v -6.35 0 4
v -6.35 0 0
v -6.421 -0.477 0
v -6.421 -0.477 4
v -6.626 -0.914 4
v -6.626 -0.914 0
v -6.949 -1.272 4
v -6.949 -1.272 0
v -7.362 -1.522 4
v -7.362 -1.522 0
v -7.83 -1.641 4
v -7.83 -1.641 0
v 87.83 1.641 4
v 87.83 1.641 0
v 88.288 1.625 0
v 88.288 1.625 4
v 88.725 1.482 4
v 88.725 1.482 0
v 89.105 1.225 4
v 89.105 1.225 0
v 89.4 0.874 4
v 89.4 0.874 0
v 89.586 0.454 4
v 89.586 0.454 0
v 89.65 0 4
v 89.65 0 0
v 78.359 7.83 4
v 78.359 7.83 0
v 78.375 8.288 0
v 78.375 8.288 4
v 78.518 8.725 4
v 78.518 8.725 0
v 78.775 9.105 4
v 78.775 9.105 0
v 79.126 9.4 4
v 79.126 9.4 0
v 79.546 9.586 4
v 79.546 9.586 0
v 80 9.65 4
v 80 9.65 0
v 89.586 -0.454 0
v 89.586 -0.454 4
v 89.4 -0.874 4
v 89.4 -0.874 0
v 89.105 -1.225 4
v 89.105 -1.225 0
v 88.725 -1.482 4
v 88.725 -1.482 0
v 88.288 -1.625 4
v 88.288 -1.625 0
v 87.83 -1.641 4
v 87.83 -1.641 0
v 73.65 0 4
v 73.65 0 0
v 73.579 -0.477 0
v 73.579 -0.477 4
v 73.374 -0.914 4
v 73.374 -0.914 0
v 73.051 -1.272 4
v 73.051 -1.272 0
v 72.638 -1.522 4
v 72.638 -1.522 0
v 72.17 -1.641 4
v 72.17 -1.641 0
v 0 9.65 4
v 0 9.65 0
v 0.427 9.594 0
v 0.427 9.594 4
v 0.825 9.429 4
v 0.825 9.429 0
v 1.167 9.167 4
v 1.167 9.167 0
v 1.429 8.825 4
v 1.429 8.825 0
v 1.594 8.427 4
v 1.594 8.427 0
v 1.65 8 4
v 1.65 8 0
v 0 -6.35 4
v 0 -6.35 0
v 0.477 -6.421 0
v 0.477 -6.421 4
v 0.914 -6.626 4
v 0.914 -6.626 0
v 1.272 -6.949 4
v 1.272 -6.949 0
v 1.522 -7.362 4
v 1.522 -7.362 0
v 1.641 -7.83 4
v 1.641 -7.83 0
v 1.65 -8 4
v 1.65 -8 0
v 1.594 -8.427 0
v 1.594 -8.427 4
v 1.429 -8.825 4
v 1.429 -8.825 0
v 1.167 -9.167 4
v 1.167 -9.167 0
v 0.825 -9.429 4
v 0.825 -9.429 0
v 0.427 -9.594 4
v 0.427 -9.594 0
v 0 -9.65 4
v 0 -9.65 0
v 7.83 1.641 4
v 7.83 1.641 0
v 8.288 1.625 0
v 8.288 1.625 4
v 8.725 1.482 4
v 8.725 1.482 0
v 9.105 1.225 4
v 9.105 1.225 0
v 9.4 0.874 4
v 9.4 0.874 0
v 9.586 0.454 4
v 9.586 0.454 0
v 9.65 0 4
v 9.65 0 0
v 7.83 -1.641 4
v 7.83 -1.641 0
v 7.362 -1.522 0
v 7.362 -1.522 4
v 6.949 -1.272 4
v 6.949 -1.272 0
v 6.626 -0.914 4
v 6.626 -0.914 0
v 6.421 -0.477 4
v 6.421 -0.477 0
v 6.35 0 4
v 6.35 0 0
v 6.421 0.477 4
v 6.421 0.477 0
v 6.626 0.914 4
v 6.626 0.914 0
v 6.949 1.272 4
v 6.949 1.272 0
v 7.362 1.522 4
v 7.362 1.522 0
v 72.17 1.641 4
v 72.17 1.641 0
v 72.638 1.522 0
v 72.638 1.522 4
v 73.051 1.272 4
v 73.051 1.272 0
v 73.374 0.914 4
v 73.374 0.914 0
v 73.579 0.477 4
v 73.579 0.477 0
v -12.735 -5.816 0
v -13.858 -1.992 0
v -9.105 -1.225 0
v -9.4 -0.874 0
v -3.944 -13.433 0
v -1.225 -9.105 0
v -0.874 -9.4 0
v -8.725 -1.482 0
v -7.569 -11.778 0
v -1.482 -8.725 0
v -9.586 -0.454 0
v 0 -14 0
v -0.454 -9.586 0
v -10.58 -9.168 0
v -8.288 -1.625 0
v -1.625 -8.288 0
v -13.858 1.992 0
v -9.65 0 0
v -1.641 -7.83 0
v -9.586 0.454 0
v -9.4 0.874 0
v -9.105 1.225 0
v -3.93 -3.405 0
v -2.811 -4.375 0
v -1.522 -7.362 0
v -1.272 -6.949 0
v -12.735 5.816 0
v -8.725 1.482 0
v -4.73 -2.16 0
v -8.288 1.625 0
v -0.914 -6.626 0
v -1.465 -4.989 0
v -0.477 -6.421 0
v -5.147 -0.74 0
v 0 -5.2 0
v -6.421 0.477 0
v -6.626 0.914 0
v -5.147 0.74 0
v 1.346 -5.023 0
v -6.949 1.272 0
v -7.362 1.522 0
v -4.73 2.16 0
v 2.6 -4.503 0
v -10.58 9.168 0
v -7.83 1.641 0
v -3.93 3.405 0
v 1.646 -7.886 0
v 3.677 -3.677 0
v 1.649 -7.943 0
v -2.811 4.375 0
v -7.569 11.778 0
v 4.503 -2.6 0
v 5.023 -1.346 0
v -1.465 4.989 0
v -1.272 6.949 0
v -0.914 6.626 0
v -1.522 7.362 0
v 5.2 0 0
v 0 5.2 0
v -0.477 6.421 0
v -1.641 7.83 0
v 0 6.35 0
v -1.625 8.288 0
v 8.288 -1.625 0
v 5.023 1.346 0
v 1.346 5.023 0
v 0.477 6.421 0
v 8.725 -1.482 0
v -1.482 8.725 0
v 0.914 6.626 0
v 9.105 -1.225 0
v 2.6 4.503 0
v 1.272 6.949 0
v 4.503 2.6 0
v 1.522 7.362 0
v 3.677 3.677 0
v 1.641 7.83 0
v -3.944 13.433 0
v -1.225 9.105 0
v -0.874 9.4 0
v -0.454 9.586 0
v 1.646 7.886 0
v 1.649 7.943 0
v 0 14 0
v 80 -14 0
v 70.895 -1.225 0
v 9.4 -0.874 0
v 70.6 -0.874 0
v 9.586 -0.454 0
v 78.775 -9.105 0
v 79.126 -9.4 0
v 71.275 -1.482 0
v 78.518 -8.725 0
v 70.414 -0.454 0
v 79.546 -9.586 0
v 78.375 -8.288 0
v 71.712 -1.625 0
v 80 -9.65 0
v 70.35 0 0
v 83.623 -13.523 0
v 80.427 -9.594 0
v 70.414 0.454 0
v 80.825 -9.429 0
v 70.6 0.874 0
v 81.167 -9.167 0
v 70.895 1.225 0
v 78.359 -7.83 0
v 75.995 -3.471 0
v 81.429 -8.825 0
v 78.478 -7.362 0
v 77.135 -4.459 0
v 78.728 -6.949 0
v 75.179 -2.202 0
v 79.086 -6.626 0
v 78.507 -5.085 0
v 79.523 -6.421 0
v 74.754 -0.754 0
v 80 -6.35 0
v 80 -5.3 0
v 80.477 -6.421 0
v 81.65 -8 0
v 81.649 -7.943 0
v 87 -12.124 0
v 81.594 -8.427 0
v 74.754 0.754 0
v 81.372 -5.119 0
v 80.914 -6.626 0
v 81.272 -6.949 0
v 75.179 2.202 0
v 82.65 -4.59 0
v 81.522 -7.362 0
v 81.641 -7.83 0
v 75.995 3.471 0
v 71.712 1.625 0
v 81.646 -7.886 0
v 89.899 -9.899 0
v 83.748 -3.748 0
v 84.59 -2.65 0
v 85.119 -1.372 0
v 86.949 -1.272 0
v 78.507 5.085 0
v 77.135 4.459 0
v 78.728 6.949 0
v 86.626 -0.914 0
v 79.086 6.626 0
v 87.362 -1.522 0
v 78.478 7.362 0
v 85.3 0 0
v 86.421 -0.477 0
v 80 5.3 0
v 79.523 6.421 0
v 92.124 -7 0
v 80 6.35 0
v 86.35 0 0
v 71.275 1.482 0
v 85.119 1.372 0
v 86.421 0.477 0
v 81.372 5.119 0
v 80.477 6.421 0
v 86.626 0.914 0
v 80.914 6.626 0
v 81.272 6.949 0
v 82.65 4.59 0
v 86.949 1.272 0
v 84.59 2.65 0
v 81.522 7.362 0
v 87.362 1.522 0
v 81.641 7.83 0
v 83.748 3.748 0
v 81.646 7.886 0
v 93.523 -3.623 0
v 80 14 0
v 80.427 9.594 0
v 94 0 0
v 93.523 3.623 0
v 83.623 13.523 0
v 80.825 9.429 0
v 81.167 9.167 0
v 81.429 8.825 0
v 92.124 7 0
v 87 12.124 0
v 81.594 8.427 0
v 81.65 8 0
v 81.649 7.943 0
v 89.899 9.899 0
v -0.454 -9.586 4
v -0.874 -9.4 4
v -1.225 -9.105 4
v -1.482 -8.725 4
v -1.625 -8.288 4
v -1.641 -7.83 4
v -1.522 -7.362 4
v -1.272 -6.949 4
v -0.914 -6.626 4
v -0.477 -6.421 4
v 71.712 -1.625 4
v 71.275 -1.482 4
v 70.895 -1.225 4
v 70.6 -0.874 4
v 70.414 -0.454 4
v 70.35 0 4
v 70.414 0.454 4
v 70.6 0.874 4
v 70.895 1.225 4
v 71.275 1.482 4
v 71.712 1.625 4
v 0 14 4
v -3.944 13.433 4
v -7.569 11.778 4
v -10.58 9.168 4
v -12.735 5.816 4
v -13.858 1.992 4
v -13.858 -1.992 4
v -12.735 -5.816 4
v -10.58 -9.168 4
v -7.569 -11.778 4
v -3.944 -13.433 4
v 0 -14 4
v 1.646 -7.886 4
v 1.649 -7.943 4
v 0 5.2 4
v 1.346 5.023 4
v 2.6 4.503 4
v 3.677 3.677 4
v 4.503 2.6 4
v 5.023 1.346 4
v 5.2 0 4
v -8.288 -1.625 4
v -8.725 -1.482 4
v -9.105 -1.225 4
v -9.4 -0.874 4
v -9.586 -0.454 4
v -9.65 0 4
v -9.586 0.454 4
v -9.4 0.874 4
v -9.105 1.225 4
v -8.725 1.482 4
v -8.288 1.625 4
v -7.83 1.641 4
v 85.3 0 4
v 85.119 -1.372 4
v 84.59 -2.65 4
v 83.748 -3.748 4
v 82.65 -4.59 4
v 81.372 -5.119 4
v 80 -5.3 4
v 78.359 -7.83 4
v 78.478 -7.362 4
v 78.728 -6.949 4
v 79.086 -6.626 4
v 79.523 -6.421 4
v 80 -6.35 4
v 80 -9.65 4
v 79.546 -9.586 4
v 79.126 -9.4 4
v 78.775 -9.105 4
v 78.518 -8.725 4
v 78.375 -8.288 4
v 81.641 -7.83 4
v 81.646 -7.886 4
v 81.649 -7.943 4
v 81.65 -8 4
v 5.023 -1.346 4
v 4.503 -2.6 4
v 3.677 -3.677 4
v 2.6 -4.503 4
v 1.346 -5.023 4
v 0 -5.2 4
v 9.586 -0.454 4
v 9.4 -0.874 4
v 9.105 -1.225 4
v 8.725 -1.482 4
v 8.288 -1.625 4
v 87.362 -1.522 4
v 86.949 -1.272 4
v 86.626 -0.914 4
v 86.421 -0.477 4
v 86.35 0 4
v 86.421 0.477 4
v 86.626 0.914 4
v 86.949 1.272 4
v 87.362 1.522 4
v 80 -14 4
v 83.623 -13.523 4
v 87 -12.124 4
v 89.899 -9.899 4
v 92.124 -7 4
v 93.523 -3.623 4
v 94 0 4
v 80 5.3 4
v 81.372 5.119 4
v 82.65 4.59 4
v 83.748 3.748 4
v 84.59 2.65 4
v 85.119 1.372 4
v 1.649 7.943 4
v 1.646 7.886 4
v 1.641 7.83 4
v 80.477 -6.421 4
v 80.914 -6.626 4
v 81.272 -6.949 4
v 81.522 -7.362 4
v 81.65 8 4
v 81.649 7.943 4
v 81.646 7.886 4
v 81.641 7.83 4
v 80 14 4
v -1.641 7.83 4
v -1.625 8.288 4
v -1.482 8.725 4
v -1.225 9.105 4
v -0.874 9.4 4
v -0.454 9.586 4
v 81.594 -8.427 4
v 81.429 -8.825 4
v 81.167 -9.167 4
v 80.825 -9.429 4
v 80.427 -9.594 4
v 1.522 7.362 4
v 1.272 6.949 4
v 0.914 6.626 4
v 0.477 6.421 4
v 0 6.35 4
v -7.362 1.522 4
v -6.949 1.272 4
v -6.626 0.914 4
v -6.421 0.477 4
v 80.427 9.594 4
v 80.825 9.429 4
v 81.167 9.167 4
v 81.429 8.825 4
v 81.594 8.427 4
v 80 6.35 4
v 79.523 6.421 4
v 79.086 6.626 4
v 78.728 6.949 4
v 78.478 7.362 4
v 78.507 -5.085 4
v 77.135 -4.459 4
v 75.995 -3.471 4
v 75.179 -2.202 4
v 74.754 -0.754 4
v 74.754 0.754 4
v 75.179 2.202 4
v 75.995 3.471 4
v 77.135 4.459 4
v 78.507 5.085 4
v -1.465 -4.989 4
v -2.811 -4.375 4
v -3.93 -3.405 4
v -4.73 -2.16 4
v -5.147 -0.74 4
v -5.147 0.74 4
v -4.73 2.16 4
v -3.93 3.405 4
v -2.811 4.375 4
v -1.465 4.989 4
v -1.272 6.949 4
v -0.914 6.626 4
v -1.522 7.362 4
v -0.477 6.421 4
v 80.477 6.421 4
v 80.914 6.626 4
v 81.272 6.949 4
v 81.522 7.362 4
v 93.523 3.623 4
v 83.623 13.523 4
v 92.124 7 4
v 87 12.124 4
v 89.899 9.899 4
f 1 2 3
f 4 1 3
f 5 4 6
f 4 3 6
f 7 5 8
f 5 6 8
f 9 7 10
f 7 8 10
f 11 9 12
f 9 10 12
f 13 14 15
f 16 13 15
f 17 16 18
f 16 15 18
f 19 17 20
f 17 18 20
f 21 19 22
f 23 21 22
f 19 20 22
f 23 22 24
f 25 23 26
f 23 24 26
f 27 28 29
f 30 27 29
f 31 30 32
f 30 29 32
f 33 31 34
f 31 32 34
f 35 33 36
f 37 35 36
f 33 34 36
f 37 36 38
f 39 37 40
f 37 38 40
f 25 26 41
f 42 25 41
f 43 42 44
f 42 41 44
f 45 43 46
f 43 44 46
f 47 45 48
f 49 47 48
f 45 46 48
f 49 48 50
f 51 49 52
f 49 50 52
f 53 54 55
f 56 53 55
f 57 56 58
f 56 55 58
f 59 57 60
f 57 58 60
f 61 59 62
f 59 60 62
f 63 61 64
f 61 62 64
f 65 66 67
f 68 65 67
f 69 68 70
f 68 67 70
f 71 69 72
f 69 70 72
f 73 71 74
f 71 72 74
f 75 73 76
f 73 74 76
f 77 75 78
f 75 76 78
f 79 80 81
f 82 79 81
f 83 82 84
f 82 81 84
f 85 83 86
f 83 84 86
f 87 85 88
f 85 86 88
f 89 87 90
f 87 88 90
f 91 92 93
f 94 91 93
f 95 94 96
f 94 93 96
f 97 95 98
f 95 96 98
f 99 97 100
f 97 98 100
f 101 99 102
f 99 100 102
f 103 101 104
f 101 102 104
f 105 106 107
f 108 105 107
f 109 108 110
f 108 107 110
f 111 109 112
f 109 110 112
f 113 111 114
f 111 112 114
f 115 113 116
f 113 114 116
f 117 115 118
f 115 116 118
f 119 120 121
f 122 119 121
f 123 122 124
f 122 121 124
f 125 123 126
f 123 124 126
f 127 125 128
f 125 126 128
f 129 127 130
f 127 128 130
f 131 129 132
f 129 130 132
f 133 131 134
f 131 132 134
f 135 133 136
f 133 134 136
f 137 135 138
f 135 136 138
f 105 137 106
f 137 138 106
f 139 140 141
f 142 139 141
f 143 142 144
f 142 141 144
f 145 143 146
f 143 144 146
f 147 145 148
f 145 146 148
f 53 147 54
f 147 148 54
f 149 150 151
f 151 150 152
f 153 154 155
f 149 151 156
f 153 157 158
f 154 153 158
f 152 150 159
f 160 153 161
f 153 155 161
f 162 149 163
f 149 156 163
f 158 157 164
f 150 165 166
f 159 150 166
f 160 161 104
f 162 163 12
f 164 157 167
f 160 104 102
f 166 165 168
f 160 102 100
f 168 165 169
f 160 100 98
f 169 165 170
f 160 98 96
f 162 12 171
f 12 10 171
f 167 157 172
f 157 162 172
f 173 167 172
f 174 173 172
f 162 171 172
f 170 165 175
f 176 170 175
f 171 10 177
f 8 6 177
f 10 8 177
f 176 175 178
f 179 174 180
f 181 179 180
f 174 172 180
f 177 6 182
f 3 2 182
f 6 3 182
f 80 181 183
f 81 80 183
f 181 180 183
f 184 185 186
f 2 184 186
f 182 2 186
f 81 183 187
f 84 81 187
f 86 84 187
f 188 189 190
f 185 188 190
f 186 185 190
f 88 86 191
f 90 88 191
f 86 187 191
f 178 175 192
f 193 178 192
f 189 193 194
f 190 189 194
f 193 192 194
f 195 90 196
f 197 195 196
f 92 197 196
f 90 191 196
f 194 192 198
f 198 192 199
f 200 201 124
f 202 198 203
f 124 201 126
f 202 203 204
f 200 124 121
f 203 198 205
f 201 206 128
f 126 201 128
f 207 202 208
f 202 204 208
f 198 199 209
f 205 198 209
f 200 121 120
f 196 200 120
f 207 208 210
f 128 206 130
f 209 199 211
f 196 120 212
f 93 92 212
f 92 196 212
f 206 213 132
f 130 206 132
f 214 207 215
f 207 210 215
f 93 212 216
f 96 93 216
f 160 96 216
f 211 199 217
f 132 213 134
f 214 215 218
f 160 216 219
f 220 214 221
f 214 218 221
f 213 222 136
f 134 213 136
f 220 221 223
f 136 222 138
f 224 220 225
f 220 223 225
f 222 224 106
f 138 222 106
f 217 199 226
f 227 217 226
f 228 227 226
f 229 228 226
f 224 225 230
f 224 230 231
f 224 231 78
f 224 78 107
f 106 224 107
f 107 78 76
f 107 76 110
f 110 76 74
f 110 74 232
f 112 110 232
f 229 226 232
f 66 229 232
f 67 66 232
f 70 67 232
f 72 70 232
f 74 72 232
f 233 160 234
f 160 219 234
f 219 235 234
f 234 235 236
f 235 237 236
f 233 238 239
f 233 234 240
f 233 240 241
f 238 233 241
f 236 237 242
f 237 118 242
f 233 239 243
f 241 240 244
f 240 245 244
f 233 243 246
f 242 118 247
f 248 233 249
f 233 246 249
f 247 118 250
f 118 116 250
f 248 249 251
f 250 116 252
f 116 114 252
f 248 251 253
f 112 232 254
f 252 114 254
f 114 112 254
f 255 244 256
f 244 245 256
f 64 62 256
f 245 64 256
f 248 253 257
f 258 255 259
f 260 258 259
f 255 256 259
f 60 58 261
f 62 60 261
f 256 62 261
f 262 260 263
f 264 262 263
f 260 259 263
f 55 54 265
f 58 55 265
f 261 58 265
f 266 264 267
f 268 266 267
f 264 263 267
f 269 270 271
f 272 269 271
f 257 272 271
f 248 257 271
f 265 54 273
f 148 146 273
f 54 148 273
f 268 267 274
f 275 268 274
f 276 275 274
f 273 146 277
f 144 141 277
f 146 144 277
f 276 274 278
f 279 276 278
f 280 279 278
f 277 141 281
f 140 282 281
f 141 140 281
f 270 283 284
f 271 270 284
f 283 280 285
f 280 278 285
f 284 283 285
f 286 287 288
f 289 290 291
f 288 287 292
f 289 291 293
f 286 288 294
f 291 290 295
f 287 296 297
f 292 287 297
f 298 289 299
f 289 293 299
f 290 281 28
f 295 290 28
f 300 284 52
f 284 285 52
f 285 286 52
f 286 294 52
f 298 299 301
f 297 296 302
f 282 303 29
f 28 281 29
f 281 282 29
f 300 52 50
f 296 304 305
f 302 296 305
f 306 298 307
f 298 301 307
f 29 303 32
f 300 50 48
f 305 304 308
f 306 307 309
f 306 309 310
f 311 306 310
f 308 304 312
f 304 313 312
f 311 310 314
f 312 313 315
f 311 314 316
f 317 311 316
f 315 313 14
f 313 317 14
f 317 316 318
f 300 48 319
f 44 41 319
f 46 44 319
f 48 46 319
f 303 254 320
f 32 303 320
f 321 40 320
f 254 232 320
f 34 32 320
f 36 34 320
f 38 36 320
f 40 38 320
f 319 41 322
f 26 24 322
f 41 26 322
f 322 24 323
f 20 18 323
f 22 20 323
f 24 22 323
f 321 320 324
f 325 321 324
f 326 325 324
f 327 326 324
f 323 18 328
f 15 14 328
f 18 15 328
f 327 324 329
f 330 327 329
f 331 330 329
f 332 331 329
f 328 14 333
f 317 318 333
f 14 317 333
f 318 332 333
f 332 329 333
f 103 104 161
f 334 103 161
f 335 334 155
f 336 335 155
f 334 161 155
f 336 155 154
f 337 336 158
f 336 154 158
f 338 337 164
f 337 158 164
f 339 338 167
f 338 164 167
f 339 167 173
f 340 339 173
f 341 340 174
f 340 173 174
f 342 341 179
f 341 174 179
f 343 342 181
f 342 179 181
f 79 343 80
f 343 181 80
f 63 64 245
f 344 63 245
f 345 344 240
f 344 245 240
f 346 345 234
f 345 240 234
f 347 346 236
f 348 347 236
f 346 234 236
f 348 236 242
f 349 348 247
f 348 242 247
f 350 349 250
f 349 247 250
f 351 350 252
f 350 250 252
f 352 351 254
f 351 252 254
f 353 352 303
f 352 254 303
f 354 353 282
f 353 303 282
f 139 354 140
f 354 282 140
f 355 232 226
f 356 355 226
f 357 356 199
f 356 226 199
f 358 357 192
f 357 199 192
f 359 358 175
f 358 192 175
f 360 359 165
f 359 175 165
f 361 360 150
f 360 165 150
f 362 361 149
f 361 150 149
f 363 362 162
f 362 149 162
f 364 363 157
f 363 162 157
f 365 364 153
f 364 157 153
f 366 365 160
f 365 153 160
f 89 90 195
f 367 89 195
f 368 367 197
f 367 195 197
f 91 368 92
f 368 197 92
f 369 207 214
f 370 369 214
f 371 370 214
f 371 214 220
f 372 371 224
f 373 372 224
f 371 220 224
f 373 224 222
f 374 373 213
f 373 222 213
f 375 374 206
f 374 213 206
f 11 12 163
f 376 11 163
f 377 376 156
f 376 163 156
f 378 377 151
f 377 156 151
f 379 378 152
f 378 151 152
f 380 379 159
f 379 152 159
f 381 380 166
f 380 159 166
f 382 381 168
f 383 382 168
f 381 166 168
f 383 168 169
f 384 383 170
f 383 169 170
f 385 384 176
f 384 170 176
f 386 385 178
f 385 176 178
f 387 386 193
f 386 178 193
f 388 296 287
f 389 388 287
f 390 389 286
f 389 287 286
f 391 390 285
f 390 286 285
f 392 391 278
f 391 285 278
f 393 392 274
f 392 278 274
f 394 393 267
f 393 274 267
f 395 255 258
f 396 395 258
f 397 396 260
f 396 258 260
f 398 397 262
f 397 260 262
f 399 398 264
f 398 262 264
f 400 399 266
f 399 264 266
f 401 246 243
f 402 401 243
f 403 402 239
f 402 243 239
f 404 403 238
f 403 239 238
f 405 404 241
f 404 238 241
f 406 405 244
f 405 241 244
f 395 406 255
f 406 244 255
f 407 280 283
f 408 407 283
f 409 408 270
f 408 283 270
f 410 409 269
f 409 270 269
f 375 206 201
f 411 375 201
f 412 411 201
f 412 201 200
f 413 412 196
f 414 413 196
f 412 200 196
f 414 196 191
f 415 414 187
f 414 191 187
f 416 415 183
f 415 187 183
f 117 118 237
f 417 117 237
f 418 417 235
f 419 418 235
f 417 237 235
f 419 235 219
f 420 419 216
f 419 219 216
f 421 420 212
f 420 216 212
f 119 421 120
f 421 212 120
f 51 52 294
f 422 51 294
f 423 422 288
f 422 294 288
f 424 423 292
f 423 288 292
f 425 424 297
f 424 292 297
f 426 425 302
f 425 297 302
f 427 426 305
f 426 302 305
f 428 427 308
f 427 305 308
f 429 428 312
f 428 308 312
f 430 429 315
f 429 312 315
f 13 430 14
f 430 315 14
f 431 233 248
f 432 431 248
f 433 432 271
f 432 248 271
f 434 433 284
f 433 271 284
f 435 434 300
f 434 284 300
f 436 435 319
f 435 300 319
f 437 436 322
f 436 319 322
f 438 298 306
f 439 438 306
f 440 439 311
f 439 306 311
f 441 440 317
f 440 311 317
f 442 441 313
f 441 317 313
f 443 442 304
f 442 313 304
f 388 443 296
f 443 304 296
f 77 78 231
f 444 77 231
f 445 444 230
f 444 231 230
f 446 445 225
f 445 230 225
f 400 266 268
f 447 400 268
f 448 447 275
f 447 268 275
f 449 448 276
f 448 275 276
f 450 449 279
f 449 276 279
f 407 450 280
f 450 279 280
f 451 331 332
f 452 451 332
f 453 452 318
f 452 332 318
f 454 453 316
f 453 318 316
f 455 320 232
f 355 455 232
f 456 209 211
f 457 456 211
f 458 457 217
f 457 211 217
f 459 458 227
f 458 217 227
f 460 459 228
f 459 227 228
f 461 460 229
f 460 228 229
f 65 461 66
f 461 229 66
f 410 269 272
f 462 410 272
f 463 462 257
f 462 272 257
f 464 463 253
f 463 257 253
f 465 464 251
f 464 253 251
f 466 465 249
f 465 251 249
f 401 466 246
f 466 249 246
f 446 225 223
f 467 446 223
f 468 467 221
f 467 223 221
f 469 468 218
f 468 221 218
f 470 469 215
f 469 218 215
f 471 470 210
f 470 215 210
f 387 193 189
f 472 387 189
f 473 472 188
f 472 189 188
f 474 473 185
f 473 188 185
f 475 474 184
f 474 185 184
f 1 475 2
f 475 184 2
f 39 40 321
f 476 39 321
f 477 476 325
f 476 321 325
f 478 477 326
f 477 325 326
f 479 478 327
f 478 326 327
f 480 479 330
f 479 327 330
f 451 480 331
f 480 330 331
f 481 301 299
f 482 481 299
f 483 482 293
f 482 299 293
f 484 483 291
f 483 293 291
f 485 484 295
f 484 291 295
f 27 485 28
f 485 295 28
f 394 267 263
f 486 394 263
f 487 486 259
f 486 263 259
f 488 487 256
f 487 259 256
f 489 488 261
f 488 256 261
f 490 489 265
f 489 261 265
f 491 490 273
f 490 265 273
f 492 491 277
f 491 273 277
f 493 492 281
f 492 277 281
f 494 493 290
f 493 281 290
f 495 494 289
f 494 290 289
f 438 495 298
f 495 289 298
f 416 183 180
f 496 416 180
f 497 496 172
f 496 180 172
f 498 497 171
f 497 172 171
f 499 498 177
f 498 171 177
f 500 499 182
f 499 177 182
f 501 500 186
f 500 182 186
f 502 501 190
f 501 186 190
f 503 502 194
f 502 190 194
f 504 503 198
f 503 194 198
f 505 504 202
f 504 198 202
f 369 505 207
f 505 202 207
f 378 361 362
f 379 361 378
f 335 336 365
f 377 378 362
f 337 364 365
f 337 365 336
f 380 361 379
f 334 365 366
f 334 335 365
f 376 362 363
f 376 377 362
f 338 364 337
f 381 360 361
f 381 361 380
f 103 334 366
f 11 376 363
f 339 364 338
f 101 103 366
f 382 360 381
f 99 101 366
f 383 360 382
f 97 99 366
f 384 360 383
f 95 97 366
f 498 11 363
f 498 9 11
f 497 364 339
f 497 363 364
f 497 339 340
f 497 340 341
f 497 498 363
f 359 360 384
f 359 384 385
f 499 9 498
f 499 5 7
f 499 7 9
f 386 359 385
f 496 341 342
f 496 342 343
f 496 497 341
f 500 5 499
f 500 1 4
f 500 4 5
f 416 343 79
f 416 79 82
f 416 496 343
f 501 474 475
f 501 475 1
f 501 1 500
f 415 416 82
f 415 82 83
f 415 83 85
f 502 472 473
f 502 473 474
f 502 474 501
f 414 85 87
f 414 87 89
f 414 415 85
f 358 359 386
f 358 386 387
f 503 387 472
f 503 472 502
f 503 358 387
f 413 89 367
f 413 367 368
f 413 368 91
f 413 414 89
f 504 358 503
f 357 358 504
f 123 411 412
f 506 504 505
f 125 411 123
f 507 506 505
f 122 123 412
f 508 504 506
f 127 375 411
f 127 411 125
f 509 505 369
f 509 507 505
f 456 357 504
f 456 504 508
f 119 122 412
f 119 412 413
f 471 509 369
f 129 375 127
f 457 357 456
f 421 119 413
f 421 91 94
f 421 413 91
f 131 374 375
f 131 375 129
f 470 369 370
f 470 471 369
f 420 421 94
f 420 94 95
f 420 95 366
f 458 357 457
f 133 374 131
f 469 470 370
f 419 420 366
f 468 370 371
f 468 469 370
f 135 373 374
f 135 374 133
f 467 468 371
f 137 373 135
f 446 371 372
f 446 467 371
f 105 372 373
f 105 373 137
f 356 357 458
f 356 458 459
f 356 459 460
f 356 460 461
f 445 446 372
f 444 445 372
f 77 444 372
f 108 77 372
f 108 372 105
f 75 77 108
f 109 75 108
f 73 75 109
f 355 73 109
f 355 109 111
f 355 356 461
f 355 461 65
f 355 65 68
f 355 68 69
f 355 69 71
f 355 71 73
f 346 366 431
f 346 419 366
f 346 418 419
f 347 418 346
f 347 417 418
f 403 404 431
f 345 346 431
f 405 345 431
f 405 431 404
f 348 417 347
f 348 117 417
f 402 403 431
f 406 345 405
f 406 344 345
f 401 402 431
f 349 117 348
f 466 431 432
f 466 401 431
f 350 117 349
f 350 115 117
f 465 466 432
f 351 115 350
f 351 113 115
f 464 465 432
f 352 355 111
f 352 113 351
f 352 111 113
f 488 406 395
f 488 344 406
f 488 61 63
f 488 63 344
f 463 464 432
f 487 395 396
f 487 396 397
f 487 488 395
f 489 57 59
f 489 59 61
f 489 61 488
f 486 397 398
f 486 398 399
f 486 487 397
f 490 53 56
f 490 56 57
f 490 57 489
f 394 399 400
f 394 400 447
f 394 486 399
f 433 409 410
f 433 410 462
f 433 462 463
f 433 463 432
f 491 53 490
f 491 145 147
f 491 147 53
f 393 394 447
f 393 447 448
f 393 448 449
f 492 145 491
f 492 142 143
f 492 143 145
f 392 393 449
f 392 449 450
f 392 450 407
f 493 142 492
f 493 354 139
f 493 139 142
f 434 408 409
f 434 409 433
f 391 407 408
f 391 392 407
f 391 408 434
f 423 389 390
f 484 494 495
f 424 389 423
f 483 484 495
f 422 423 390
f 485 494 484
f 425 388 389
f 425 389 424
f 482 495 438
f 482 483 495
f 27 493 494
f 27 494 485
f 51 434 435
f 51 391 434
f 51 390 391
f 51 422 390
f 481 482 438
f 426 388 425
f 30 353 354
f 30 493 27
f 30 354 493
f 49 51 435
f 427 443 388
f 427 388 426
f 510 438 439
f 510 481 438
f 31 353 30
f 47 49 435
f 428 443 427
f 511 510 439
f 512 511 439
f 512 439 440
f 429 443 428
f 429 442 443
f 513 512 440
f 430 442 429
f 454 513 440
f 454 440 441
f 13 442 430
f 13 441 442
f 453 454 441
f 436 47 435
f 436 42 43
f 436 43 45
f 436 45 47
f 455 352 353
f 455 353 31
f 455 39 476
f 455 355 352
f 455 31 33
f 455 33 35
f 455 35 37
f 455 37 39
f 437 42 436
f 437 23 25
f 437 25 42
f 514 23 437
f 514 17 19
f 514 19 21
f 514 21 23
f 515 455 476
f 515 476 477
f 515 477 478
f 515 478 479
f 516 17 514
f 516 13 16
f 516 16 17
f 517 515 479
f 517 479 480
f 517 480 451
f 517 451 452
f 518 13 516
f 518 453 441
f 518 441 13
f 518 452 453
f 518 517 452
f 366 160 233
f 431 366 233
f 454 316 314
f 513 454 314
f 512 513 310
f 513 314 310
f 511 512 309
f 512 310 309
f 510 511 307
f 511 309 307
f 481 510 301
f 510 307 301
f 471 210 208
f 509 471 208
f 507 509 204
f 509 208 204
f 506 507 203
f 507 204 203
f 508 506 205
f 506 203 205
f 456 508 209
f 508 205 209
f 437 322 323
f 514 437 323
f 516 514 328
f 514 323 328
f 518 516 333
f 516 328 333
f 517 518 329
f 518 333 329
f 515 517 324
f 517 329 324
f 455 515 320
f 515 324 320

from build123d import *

# Parameters (mm, degrees)
EXTRUDE_1_DEPTH = 4


with BuildPart() as part:
    # 草图1 → 凸台-拉伸1 (new body)
    with BuildSketch(Plane.XY):
        with BuildLine():
            Line((0, 9.65), (0, 14))
            ThreePointArc((0, 14), (-14, 0), (0, -14))
            Line((0, -14), (0, -9.65))
            ThreePointArc((0, -9.65), (-1.225409689, -9.104930357), (-1.641202867, -7.82984375))
            ThreePointArc((-1.641202867, -7.82984375), (-5.656854249, -5.656854249), (-7.82984375, -1.641202867))
            ThreePointArc((-7.82984375, -1.641202867), (-9.65, 0), (-7.82984375, 1.641202867))
            ThreePointArc((-7.82984375, 1.641202867), (-5.656854249, 5.656854249), (-1.641202867, 7.82984375))
            ThreePointArc((-1.641202867, 7.82984375), (-1.225409689, 9.104930357), (0, 9.65))
        make_face()
        with BuildLine():
            ThreePointArc((0, 6.35), (-1.104930357, 6.774590311), (-1.641202867, 7.82984375))
            ThreePointArc((-1.641202867, 7.82984375), (-5.656854249, 5.656854249), (-7.82984375, 1.641202867))
            ThreePointArc((-7.82984375, 1.641202867), (-6.774590311, 1.104930357), (-6.35, 0))
            ThreePointArc((-6.35, 0), (-6.774590311, -1.104930357), (-7.82984375, -1.641202867))
            ThreePointArc((-7.82984375, -1.641202867), (-5.656854249, -5.656854249), (-1.641202867, -7.82984375))
            ThreePointArc((-1.641202867, -7.82984375), (-1.104930357, -6.774590311), (0, -6.35))
            Line((0, -6.35), (0, -5.2))
            ThreePointArc((0, -5.2), (-5.2, 0), (0, 5.2))
            Line((0, 5.2), (0, 6.35))
        make_face()
        with BuildLine():
            ThreePointArc((1.641202867, 7.82984375), (1.104930357, 6.774590311), (0, 6.35))
            Line((0, 6.35), (0, 5.2))
            ThreePointArc((0, 5.2), (3.676955262, 3.676955262), (5.2, 0))
            ThreePointArc((5.2, 0), (3.676955262, -3.676955262), (0, -5.2))
            Line((0, -5.2), (0, -6.35))
            ThreePointArc((0, -6.35), (1.104930357, -6.774590311), (1.641202867, -7.82984375))
            ThreePointArc((1.641202867, -7.82984375), (5.656854249, -5.656854249), (7.82984375, -1.641202867))
            ThreePointArc((7.82984375, -1.641202867), (6.35, 0), (7.82984375, 1.641202867))
            ThreePointArc((7.82984375, 1.641202867), (5.656854249, 5.656854249), (1.641202867, 7.82984375))
        make_face()
        with BuildLine():
            ThreePointArc((14, 0), (9.899494937, 9.899494937), (0, 14))
            Line((0, 14), (0, 9.65))
            ThreePointArc((0, 9.65), (1.166726189, 9.166726189), (1.65, 8))
            ThreePointArc((1.65, 8), (1.647799249, 7.914808247), (1.641202867, 7.82984375))
            ThreePointArc((1.641202867, 7.82984375), (5.656854249, 5.656854249), (7.82984375, 1.641202867))
            ThreePointArc((7.82984375, 1.641202867), (9.104930357, 1.225409689), (9.65, 0))
            ThreePointArc((9.65, 0), (9.104930357, -1.225409689), (7.82984375, -1.641202867))
            ThreePointArc((7.82984375, -1.641202867), (5.656854249, -5.656854249), (1.641202867, -7.82984375))
            ThreePointArc((1.641202867, -7.82984375), (1.647799249, -7.914808247), (1.65, -8))
            ThreePointArc((1.65, -8), (1.166726189, -9.166726189), (0, -9.65))
            Line((0, -9.65), (0, -14))
            ThreePointArc((0, -14), (9.899494937, -9.899494937), (14, 0))
        make_face()
        with BuildLine():
            ThreePointArc((94, 0), (89.899494937, 9.899494937), (80, 14))
            Line((80, 14), (80, 9.65))
            ThreePointArc((80, 9.65), (81.166726189, 9.166726189), (81.65, 8))
            ThreePointArc((81.65, 8), (81.647799249, 7.914808247), (81.641202867, 7.82984375))
            ThreePointArc((81.641202867, 7.82984375), (85.656854249, 5.656854249), (87.82984375, 1.641202867))
            ThreePointArc((87.82984375, 1.641202867), (89.104930357, 1.225409689), (89.65, 0))
            ThreePointArc((89.65, 0), (89.104930357, -1.225409689), (87.82984375, -1.641202867))
            ThreePointArc((87.82984375, -1.641202867), (85.656854249, -5.656854249), (81.641202867, -7.82984375))
            ThreePointArc((81.641202867, -7.82984375), (81.647799249, -7.914808247), (81.65, -8))
            ThreePointArc((81.65, -8), (81.166726189, -9.166726189), (80, -9.65))
            Line((80, -9.65), (80, -14))
            ThreePointArc((80, -14), (89.899494937, -9.899494937), (94, 0))
        make_face()
        with BuildLine():
            Line((80, 9.65), (80, 14))
            ThreePointArc((80, 14), (66, 0), (80, -14))
            Line((80, -14), (80, -9.65))
            ThreePointArc((80, -9.65), (78.774590311, -9.104930357), (78.358797133, -7.82984375))
            ThreePointArc((78.358797133, -7.82984375), (74.343145751, -5.656854249), (72.17015625, -1.641202867))
            ThreePointArc((72.17015625, -1.641202867), (70.35, 0), (72.17015625, 1.641202867))
            ThreePointArc((72.17015625, 1.641202867), (74.343145751, 5.656854249), (78.358797133, 7.82984375))
            ThreePointArc((78.358797133, 7.82984375), (78.774590311, 9.104930357), (80, 9.65))
        make_face()
        with BuildLine():
            ThreePointArc((80, 6.35), (78.895069643, 6.774590311), (78.358797133, 7.82984375))
            ThreePointArc((78.358797133, 7.82984375), (74.343145751, 5.656854249), (72.17015625, 1.641202867))
            ThreePointArc((72.17015625, 1.641202867), (73.225409689, 1.104930357), (73.65, 0))
            ThreePointArc((73.65, 0), (73.225409689, -1.104930357), (72.17015625, -1.641202867))
            ThreePointArc((72.17015625, -1.641202867), (74.343145751, -5.656854249), (78.358797133, -7.82984375))
            ThreePointArc((78.358797133, -7.82984375), (78.895069643, -6.774590311), (80, -6.35))
            Line((80, -6.35), (80, -5.3))
            ThreePointArc((80, -5.3), (74.7, 0), (80, 5.3))
            Line((80, 5.3), (80, 6.35))
        make_face()
        with BuildLine():
            ThreePointArc((81.641202867, 7.82984375), (81.104930357, 6.774590311), (80, 6.35))
            Line((80, 6.35), (80, 5.3))
            ThreePointArc((80, 5.3), (83.74766594, 3.74766594), (85.3, 0))
            ThreePointArc((85.3, 0), (83.74766594, -3.74766594), (80, -5.3))
            Line((80, -5.3), (80, -6.35))
            ThreePointArc((80, -6.35), (81.104930357, -6.774590311), (81.641202867, -7.82984375))
            ThreePointArc((81.641202867, -7.82984375), (85.656854249, -5.656854249), (87.82984375, -1.641202867))
            ThreePointArc((87.82984375, -1.641202867), (86.35, 0), (87.82984375, 1.641202867))
            ThreePointArc((87.82984375, 1.641202867), (85.656854249, 5.656854249), (81.641202867, 7.82984375))
        make_face()
        with BuildLine():
            Line((80, 14), (0, 14))
            ThreePointArc((0, 14), (9.899494937, 9.899494937), (14, 0))
            ThreePointArc((14, 0), (9.899494937, -9.899494937), (0, -14))
            Line((0, -14), (80, -14))
            ThreePointArc((80, -14), (66, 0), (80, 14))
        make_face()
    extrude(amount=EXTRUDE_1_DEPTH)


solid = part.part
